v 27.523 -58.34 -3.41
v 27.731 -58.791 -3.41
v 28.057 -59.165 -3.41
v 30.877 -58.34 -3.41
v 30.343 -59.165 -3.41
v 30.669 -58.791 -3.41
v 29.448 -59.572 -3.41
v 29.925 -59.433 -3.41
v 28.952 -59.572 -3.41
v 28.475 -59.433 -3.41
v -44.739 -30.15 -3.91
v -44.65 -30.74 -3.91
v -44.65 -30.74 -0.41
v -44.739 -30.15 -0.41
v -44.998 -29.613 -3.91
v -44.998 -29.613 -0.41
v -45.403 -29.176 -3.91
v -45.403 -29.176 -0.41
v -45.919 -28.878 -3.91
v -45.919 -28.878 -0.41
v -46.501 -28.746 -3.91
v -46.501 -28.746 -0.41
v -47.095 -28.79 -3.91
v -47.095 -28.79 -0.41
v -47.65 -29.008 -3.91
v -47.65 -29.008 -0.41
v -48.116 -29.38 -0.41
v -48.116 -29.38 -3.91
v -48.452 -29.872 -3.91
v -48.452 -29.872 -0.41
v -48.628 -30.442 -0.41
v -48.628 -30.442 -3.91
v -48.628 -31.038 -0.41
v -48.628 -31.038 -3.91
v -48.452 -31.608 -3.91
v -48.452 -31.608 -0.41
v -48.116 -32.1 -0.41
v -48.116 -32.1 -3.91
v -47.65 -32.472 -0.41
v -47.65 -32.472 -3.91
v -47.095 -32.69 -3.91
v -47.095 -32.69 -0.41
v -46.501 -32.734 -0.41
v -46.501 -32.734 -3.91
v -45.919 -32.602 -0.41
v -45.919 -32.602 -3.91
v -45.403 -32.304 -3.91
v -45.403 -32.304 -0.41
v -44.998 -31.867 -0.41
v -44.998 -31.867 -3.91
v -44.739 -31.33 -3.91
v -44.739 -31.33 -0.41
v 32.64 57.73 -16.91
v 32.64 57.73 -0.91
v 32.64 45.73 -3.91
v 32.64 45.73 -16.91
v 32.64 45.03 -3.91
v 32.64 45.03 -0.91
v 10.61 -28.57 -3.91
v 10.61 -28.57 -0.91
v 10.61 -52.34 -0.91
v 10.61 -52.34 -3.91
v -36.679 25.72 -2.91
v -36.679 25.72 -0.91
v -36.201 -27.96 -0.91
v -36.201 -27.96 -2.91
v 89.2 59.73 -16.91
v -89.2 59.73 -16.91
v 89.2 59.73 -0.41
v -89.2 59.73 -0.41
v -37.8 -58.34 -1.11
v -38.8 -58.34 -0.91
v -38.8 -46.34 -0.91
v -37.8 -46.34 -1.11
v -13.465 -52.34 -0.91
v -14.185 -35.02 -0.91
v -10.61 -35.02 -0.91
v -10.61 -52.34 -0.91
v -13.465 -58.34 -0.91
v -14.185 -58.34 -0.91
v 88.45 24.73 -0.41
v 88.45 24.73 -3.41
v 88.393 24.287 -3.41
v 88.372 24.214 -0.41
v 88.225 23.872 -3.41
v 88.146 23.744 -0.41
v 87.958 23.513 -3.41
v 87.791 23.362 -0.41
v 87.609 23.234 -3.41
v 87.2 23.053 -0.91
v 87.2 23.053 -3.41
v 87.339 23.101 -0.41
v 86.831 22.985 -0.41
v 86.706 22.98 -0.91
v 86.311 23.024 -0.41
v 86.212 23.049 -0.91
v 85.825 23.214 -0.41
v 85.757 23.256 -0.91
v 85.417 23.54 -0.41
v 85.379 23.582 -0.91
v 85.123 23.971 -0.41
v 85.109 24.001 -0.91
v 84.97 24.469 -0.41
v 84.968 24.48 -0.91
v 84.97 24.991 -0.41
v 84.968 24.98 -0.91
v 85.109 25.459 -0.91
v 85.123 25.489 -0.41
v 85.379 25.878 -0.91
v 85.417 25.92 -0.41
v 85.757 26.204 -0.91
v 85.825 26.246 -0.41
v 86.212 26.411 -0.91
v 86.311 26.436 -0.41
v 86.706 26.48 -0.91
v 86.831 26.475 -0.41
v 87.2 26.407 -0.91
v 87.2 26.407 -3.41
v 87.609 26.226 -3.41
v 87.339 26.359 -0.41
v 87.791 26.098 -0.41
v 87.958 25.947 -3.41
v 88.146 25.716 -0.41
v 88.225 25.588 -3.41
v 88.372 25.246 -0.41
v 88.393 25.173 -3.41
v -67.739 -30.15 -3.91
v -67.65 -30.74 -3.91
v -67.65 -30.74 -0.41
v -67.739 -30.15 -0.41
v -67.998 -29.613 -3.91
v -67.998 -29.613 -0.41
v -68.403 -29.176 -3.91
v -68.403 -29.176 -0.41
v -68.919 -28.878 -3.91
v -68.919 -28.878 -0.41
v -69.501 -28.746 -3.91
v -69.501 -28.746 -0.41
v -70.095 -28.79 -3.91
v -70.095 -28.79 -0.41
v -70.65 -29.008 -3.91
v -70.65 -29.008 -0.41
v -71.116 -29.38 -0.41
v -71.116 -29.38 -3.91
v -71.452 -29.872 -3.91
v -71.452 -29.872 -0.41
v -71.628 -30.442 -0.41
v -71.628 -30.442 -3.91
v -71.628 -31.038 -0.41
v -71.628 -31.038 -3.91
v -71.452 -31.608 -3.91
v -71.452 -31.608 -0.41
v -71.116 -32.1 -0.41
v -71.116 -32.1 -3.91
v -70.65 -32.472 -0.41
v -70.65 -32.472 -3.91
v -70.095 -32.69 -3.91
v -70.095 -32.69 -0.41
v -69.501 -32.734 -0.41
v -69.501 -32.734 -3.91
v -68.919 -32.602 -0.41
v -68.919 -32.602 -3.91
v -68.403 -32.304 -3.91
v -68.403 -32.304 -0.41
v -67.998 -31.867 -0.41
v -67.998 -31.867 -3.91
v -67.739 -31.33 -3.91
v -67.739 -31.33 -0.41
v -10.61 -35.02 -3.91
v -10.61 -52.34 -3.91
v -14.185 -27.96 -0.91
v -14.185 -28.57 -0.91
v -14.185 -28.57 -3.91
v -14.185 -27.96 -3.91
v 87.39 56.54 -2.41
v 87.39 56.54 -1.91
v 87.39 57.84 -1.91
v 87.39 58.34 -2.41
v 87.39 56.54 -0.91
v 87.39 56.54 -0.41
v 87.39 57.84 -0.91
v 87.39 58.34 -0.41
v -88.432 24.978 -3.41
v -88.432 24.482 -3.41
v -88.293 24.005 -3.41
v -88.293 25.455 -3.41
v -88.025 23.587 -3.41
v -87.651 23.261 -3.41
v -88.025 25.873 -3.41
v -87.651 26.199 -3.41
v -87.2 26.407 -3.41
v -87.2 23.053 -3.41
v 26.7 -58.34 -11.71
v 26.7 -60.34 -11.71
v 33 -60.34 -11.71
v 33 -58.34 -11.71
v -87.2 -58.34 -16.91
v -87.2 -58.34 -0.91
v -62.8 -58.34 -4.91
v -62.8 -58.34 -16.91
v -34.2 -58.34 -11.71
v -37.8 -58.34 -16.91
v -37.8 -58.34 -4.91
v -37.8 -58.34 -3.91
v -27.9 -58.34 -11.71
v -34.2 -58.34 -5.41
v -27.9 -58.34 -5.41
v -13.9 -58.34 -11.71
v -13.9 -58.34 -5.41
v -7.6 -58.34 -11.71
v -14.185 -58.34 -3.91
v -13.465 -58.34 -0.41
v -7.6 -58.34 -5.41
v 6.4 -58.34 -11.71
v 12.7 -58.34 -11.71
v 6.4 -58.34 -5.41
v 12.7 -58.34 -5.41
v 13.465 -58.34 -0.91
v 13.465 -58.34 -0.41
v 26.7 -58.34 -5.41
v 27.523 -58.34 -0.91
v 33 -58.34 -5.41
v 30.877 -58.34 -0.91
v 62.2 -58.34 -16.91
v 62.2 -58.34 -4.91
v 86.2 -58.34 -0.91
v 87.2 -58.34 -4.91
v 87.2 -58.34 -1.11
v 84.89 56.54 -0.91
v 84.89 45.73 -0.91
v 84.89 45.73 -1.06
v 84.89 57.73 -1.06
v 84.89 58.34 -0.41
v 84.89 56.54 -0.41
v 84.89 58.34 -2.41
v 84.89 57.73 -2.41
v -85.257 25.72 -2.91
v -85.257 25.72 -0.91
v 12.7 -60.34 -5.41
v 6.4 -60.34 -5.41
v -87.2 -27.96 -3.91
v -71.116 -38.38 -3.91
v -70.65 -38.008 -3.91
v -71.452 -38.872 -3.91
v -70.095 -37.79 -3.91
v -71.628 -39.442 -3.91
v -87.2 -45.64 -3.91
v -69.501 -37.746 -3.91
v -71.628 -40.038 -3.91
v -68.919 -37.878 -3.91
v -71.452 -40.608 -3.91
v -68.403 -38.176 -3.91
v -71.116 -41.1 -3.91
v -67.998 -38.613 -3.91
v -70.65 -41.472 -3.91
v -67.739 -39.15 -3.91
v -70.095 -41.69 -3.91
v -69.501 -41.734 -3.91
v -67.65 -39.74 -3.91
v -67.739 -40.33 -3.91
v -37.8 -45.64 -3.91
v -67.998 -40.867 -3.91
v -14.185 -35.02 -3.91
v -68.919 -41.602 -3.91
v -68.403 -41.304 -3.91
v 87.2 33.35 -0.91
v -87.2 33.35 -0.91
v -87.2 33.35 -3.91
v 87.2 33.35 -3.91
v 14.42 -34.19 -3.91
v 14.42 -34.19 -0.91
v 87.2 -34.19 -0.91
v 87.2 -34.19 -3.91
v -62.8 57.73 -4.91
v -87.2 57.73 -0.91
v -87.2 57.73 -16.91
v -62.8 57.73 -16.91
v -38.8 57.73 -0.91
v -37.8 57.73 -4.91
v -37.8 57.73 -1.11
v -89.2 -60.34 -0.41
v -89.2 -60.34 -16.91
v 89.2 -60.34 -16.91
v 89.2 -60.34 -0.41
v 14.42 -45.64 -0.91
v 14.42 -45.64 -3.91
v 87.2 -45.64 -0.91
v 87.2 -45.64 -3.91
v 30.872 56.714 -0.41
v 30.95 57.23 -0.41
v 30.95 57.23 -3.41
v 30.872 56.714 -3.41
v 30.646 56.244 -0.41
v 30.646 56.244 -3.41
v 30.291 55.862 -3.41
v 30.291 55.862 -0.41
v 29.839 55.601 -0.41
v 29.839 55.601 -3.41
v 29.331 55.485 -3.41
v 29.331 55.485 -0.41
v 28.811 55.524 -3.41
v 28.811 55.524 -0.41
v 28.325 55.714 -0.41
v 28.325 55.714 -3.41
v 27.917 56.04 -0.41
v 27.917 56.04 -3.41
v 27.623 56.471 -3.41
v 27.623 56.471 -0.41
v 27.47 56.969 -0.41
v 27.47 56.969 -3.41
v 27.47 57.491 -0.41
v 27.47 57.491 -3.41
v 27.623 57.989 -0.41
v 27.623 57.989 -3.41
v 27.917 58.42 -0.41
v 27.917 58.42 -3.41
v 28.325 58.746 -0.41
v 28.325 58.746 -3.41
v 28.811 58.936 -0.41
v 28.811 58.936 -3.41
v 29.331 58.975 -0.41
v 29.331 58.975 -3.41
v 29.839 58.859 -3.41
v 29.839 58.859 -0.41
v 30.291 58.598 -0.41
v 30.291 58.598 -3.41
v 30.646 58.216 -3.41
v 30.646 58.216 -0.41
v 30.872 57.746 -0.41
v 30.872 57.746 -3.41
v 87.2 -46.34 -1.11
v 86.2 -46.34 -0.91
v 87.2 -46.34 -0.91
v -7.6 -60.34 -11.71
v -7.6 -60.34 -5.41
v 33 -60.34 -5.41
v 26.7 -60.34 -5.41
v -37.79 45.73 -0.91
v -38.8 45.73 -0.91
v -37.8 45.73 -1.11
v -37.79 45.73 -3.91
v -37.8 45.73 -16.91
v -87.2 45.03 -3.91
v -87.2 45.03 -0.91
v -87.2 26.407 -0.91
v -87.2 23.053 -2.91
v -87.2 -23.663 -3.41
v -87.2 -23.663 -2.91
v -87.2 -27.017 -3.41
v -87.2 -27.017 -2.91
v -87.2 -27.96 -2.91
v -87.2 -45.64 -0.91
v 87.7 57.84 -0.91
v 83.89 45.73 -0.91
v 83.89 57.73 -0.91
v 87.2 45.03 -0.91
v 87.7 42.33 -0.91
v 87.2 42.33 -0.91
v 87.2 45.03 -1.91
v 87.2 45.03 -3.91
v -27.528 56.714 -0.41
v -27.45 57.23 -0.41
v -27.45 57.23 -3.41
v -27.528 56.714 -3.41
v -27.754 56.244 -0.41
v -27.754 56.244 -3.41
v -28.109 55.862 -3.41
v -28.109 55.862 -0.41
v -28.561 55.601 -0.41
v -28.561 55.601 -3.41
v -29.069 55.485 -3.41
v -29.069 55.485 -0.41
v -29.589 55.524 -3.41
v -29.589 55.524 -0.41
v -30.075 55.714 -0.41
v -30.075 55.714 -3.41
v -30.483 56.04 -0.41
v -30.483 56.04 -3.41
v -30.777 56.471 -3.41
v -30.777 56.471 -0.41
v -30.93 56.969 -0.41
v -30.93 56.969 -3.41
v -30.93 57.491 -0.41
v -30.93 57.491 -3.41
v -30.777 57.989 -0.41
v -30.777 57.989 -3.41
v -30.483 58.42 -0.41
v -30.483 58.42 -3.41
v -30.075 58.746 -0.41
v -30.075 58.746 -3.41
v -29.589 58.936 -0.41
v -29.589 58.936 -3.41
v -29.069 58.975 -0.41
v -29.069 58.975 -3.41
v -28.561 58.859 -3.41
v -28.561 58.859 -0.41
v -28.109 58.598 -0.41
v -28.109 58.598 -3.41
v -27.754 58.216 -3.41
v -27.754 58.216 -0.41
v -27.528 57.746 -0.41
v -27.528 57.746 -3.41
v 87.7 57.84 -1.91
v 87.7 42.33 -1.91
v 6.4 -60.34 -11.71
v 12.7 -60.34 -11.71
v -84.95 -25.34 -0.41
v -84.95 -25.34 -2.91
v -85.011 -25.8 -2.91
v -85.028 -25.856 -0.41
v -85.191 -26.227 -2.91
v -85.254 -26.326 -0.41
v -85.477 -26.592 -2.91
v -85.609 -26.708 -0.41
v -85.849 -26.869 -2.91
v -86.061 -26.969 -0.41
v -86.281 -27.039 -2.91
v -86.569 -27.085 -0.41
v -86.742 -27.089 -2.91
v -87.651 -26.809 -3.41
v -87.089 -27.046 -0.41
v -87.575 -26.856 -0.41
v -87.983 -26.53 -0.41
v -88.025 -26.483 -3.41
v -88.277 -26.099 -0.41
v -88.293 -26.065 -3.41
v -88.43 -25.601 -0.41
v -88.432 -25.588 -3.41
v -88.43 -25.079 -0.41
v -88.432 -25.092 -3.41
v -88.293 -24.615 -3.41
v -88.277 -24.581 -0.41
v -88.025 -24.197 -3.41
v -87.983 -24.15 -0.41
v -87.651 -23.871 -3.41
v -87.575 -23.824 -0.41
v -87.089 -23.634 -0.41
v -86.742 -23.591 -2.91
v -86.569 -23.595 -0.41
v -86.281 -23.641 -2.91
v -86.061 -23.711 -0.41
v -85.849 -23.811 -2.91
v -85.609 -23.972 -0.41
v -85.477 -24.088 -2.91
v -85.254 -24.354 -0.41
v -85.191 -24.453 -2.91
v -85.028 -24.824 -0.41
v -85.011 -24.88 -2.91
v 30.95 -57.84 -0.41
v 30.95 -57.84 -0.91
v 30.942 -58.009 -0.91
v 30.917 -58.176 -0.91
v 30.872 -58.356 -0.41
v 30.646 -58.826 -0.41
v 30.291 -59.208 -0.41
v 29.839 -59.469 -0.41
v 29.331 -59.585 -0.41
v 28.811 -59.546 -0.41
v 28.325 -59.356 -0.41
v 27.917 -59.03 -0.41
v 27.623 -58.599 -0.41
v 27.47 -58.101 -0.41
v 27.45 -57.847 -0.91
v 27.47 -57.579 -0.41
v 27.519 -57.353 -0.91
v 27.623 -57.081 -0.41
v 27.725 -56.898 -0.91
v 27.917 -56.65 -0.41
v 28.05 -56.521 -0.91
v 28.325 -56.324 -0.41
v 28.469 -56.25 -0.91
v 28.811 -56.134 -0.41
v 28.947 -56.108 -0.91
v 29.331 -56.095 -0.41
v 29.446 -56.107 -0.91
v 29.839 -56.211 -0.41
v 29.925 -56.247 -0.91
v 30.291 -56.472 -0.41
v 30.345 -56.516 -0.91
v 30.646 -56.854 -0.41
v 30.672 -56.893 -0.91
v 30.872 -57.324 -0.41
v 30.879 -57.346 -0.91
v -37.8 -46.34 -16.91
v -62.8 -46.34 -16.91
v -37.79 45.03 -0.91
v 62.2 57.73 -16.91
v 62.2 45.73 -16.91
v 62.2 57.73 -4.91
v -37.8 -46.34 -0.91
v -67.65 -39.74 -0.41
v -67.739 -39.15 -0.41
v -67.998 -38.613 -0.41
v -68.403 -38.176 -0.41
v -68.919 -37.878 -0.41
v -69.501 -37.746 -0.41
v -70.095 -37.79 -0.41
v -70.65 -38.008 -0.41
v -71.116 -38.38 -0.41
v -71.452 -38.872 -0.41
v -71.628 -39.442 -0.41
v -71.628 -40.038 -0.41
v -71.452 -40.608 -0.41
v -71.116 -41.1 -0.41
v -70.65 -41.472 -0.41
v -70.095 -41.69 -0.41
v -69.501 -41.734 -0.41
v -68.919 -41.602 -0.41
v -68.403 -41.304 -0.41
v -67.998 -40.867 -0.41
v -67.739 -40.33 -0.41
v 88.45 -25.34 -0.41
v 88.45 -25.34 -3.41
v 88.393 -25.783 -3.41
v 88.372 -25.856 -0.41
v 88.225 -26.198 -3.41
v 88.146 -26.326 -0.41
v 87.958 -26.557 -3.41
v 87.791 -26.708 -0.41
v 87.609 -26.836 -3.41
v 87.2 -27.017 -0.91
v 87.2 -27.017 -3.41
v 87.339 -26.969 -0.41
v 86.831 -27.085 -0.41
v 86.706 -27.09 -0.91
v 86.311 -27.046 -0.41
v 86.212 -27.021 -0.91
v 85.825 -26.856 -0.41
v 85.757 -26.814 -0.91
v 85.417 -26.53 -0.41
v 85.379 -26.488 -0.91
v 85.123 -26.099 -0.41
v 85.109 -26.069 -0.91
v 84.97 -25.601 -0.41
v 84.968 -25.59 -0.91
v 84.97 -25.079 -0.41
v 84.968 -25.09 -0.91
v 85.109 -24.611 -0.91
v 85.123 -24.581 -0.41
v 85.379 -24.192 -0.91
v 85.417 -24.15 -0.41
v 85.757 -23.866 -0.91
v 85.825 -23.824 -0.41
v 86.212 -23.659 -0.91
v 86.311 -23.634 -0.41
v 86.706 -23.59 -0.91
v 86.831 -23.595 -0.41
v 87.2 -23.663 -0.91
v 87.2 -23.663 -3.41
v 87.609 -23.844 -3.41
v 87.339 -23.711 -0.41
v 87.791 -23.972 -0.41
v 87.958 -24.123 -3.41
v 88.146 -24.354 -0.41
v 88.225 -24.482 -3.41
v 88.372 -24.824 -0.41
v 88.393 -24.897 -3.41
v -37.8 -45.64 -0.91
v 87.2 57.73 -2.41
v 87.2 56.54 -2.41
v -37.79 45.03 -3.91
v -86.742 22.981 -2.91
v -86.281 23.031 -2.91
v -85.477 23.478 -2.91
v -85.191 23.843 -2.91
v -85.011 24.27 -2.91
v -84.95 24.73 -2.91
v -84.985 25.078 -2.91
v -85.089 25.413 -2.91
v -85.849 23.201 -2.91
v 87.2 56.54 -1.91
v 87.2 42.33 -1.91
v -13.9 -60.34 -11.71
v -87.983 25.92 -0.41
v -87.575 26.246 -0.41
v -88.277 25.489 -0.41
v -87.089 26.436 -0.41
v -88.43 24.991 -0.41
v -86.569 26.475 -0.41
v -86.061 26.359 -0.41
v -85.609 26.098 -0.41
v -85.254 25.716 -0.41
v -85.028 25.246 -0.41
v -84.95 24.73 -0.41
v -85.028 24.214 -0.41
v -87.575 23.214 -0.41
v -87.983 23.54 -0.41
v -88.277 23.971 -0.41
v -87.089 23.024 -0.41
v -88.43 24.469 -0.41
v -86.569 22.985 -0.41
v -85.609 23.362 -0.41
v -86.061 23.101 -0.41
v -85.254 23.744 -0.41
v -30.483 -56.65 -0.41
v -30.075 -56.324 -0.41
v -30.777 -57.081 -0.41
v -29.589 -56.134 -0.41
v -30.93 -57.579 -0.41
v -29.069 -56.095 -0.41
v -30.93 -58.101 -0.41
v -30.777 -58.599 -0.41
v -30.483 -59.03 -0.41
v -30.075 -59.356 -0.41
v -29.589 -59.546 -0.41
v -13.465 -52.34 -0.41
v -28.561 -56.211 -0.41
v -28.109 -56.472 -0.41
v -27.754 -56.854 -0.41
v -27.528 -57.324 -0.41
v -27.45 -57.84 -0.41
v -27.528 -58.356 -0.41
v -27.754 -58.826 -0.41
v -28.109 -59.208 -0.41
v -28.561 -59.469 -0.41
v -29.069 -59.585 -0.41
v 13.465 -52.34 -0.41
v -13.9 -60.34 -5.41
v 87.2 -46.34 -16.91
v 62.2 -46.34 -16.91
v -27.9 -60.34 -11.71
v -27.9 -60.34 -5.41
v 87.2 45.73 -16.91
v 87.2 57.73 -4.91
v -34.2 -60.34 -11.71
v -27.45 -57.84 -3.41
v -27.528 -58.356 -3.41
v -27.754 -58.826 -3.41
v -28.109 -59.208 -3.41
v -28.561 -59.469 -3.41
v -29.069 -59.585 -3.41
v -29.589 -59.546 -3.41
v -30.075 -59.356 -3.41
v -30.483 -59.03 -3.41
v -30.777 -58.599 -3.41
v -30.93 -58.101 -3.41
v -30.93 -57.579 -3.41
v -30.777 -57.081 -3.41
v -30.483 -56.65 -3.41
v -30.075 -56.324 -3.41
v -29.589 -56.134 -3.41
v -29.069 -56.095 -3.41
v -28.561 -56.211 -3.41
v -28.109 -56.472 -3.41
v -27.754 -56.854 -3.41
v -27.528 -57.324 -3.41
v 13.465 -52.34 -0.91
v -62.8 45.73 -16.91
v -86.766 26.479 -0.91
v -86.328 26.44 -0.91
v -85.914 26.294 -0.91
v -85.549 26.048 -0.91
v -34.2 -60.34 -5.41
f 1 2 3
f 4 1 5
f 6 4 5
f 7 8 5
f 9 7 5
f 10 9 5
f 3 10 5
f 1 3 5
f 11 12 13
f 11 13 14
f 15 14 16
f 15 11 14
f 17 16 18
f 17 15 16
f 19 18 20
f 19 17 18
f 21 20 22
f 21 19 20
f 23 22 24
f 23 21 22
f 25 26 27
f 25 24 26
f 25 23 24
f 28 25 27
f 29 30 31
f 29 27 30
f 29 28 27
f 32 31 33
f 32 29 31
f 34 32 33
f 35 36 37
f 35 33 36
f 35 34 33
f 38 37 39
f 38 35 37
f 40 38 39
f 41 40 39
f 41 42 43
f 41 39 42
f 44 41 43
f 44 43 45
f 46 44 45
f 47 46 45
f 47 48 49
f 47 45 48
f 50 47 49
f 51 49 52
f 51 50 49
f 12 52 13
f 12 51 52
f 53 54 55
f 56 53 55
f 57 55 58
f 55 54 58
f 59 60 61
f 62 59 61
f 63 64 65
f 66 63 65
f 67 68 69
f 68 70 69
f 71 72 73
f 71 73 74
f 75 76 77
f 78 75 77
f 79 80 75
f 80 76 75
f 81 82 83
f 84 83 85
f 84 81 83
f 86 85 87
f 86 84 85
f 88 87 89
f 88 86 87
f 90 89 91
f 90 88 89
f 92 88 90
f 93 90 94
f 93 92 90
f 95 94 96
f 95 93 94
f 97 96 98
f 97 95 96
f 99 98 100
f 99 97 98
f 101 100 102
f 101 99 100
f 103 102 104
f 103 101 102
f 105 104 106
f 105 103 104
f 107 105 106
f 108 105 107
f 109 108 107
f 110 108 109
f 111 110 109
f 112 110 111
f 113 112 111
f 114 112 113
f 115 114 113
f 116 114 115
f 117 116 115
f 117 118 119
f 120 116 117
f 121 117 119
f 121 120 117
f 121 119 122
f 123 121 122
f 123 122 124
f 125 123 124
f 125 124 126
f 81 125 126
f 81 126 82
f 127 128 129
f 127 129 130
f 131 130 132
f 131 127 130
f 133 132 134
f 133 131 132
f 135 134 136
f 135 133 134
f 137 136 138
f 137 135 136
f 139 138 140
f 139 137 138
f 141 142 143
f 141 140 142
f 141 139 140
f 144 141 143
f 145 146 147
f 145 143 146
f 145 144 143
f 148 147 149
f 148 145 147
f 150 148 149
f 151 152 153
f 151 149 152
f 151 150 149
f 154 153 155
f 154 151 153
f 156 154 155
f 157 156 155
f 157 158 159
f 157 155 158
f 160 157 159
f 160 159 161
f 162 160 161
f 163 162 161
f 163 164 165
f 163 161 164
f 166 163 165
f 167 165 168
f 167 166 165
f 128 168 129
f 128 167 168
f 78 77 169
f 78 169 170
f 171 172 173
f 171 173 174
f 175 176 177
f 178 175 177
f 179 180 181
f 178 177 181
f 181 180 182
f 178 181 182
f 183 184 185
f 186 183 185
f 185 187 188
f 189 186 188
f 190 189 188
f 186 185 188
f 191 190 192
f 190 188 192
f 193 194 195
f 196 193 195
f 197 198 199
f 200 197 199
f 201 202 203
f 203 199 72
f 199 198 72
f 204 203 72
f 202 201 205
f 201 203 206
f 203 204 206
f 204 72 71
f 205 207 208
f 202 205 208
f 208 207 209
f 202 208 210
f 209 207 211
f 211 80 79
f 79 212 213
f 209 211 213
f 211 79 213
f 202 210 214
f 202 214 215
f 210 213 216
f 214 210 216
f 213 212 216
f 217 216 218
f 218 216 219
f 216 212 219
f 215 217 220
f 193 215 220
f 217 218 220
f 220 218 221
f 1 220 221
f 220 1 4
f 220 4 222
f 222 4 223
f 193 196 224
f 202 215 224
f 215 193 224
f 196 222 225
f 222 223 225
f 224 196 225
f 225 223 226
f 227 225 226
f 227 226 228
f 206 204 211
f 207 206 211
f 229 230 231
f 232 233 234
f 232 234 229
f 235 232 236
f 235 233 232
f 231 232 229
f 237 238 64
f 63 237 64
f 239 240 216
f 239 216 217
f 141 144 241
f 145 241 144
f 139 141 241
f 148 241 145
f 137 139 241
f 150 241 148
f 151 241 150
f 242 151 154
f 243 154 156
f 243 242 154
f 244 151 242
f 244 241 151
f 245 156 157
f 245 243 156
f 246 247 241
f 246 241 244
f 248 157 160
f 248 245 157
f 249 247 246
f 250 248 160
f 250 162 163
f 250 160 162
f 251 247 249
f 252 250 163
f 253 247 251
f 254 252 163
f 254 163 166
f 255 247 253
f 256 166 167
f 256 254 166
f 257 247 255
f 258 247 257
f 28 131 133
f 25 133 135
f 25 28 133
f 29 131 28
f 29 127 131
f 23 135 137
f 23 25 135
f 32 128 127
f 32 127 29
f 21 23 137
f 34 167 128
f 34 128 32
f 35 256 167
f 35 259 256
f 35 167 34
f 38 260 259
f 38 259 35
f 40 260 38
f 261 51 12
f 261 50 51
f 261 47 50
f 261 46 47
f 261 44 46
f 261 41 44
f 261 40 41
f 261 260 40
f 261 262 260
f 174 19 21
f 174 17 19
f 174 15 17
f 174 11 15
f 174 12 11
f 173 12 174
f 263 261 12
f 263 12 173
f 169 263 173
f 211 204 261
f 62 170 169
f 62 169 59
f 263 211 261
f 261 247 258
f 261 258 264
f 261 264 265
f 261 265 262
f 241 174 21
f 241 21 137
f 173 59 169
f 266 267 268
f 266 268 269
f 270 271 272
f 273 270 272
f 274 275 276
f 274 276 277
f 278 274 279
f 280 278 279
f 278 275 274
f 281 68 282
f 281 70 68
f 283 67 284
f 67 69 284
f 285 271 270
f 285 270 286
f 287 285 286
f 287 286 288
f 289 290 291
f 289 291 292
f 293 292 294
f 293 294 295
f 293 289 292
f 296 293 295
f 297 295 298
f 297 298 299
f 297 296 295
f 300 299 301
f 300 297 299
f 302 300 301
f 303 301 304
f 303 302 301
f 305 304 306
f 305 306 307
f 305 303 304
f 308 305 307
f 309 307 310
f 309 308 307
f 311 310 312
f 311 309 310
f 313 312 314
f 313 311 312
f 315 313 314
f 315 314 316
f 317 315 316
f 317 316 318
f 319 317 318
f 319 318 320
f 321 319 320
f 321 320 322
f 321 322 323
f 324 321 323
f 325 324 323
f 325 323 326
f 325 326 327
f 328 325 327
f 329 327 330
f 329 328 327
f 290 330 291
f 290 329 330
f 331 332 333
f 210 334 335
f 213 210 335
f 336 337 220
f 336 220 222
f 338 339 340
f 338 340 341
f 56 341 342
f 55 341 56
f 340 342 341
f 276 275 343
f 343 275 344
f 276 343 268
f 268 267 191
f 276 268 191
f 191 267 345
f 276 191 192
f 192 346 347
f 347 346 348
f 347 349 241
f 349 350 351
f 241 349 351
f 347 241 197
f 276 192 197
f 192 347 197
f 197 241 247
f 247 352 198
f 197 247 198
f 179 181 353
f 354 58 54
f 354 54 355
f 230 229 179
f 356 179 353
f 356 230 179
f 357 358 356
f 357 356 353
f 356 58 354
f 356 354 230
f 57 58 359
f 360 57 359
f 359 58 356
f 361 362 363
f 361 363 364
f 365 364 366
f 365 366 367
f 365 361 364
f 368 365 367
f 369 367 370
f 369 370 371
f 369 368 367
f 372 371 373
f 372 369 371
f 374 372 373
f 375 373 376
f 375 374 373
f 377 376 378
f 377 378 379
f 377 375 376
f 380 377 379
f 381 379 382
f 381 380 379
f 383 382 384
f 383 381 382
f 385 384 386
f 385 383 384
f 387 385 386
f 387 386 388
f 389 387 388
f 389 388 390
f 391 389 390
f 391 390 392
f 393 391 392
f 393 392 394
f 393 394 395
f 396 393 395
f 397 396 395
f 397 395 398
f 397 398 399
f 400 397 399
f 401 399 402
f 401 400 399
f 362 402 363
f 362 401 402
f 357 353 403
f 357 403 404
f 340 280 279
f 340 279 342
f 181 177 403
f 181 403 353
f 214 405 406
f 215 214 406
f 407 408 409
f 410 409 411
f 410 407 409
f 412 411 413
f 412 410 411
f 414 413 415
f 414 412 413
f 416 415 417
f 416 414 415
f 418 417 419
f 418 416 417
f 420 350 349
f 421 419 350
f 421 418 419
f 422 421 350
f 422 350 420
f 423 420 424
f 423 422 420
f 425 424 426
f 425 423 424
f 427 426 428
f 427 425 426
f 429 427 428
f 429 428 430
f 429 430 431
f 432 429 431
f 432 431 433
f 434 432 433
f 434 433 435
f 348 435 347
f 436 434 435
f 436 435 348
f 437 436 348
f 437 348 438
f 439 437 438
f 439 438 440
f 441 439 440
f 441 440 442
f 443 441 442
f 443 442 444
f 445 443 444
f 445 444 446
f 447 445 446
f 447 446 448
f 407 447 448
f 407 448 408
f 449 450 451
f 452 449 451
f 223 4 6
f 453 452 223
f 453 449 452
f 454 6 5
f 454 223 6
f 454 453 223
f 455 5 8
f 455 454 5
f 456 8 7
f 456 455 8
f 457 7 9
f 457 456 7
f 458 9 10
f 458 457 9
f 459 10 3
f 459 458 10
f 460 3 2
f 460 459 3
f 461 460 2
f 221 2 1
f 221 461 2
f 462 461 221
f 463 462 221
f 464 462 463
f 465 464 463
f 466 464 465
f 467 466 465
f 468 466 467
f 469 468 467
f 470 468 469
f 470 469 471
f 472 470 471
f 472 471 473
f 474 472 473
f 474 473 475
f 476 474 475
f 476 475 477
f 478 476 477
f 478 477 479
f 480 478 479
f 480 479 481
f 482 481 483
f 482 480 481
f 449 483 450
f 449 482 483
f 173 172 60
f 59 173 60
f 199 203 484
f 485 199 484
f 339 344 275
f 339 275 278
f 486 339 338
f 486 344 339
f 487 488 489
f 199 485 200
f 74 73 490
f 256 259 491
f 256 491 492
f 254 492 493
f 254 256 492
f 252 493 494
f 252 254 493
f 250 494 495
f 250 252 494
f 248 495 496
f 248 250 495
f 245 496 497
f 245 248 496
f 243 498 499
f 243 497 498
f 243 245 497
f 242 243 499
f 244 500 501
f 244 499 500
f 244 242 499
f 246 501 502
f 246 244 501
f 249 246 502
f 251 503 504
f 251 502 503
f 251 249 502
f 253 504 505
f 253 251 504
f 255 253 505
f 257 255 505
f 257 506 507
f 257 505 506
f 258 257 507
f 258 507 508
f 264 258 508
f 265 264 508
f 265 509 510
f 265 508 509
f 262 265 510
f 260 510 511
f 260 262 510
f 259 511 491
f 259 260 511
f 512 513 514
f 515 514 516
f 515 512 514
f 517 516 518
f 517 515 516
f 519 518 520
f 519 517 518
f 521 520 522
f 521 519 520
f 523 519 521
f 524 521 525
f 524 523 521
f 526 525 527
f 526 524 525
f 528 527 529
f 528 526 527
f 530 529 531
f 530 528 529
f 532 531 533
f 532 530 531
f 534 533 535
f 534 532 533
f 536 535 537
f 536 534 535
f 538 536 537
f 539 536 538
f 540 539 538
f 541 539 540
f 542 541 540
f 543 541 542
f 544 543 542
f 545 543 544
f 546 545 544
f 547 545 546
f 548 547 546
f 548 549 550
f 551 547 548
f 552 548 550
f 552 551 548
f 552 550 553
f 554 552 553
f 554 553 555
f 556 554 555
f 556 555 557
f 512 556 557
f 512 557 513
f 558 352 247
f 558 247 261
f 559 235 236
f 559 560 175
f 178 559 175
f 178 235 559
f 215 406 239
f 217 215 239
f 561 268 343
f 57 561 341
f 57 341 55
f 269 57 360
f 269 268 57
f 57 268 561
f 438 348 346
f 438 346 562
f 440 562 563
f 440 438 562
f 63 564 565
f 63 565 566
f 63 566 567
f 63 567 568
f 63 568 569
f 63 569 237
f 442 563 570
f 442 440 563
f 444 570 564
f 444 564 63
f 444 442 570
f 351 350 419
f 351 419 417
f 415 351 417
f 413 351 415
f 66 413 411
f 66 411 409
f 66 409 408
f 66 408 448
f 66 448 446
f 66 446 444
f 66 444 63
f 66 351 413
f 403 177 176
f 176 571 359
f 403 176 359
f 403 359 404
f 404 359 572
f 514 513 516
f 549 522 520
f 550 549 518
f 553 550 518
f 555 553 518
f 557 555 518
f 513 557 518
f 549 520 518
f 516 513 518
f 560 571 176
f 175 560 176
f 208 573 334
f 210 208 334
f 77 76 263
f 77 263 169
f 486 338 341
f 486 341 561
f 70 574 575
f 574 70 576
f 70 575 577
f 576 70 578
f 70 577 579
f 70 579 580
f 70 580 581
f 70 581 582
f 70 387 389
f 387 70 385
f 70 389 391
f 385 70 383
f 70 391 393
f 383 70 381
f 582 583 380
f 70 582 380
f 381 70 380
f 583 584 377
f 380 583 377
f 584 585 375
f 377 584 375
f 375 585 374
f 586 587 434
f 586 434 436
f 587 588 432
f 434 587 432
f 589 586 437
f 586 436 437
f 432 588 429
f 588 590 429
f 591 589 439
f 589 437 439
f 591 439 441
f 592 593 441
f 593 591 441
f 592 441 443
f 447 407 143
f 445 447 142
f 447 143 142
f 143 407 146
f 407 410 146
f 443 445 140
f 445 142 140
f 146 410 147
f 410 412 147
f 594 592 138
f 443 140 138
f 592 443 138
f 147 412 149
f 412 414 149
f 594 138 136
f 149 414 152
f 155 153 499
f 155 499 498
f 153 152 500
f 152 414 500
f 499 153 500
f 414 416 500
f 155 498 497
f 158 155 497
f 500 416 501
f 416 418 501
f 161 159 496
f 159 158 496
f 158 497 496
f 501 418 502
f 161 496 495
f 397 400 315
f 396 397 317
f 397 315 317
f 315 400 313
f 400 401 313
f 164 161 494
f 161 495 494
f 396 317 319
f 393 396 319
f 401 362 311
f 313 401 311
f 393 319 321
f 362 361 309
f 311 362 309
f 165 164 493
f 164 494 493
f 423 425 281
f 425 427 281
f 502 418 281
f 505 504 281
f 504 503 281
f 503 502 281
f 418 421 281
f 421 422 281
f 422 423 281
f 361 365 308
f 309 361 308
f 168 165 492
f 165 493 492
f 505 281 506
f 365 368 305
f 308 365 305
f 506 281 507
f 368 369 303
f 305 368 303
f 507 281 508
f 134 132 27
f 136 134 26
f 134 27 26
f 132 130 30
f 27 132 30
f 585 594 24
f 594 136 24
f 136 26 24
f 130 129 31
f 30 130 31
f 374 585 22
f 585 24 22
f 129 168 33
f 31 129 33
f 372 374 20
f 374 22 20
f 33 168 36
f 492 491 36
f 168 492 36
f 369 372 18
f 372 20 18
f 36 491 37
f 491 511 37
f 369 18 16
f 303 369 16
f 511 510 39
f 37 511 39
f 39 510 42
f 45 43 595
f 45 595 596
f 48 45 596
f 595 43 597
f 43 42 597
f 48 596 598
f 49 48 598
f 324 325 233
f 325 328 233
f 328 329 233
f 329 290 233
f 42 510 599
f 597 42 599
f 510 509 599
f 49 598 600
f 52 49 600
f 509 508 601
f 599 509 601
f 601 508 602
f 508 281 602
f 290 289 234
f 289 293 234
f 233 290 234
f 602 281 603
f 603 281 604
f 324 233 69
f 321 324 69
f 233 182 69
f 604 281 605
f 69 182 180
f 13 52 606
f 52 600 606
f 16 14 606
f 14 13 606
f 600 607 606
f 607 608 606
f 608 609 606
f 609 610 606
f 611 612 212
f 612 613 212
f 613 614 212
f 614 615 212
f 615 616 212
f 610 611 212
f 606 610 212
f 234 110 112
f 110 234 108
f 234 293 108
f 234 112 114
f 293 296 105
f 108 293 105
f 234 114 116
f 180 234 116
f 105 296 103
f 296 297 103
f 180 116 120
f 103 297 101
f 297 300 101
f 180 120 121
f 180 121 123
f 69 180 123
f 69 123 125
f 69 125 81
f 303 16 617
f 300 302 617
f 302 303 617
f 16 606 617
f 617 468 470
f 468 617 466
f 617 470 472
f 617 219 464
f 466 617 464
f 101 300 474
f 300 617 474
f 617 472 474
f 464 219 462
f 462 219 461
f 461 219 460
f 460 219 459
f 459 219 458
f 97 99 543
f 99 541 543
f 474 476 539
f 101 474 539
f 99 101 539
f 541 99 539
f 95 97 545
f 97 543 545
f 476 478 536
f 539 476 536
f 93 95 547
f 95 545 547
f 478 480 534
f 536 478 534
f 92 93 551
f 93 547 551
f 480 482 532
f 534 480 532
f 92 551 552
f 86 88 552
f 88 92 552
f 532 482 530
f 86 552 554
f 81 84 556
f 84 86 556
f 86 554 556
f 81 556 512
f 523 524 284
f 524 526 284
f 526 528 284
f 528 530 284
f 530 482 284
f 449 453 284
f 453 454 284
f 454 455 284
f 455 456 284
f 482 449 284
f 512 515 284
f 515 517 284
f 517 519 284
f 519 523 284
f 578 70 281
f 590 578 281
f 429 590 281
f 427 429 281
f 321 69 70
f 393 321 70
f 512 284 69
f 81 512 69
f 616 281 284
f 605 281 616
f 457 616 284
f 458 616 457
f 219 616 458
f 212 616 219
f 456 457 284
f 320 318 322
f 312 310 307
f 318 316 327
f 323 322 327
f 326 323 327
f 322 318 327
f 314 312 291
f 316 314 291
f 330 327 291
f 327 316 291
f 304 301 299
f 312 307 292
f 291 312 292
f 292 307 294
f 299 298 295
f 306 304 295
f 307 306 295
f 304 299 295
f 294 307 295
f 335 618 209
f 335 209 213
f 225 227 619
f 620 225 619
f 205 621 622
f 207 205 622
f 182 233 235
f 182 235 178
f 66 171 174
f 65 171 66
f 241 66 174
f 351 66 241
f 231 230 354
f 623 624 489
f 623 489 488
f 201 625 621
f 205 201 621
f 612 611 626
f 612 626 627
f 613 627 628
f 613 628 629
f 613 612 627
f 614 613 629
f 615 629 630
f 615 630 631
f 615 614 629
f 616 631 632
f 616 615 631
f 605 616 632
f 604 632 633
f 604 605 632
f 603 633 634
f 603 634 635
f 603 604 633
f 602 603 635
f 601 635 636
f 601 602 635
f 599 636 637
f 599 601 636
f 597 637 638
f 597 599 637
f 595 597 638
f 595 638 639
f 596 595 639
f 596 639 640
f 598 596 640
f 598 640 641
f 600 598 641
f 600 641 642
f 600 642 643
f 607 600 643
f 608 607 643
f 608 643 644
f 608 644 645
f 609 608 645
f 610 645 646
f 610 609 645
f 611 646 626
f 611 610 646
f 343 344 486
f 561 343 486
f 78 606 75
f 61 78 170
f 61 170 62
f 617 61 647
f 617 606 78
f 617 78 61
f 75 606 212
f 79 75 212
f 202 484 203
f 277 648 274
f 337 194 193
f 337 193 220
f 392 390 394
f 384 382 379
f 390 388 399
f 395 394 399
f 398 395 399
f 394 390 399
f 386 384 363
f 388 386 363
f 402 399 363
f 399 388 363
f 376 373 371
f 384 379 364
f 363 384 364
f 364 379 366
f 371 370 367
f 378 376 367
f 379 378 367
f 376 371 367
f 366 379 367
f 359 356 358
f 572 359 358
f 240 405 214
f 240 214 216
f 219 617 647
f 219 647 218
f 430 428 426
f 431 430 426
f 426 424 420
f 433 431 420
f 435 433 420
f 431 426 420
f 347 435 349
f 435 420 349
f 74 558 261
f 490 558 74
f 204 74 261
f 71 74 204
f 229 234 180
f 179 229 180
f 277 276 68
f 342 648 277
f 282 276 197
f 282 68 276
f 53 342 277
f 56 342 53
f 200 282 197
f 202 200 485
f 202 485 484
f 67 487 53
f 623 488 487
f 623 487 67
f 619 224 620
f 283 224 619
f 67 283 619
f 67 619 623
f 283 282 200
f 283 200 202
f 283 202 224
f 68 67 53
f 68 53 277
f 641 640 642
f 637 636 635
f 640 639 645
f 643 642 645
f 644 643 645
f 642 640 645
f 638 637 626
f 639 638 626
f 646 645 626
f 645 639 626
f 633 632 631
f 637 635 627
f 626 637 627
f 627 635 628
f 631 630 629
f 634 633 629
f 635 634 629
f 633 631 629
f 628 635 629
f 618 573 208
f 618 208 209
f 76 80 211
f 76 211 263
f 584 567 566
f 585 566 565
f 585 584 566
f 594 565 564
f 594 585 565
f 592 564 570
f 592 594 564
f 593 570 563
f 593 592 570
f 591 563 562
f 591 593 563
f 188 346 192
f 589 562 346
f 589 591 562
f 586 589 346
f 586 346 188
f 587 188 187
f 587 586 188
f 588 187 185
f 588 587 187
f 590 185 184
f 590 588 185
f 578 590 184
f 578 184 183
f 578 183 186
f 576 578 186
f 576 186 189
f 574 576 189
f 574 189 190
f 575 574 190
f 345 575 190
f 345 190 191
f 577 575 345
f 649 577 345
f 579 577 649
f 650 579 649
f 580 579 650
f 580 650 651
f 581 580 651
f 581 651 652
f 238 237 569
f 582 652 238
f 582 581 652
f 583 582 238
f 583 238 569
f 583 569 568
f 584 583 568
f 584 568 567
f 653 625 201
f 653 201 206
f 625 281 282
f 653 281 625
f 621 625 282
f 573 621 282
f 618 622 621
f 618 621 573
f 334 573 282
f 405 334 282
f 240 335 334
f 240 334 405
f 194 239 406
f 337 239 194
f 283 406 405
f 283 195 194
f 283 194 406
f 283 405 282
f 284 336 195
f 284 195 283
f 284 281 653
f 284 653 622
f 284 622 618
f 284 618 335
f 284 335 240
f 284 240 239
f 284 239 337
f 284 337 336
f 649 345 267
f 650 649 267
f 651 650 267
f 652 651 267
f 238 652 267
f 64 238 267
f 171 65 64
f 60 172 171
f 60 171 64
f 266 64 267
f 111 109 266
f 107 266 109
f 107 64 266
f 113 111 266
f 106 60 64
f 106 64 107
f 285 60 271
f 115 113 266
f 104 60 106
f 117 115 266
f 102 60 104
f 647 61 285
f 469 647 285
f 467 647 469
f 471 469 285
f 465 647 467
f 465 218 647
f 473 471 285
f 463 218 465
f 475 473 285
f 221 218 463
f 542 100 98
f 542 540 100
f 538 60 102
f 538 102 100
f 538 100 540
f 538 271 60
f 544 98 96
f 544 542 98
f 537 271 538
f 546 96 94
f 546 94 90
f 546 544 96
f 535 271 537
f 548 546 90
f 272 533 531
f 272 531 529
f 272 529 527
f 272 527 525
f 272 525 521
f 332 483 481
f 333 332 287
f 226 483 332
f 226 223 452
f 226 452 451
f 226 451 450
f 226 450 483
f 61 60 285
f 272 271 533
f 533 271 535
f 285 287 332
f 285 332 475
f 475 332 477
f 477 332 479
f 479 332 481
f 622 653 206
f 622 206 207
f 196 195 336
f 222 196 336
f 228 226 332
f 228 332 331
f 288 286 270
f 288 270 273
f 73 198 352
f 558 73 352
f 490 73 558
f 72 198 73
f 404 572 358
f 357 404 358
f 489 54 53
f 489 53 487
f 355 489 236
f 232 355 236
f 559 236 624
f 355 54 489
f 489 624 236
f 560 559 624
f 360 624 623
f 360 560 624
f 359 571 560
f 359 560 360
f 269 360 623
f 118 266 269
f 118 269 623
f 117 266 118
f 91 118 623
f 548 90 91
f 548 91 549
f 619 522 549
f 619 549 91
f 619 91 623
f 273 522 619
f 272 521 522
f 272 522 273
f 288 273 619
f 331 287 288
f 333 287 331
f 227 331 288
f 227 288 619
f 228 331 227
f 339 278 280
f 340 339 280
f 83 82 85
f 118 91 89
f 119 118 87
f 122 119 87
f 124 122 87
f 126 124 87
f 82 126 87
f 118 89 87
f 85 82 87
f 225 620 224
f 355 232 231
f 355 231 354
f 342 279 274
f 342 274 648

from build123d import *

# Parameters (mm, degrees)
SKETCH028_W         = 178.4
SKETCH028_H         = 120.07
PAD017_DEPTH        = 1
SKETCH029_R         = 1.75
PAD018_DEPTH        = 3
SKETCH026_W         = 32
SKETCH026_H         = 18
PAD015_DEPTH        = 1
SKETCH027_R         = 2
PAD016_DEPTH        = 10
SKETCH002_W         = 178.4
SKETCH002_H         = 120.07
SKETCH002_W_2       = 26.9298
SKETCH002_H_2       = 6
PAD002_DEPTH        = 0.5
SKETCH003_W         = 178.4
SKETCH003_H         = 120.07
SKETCH003_W_2       = 174.4
SKETCH003_H_2       = 116.07
PAD003_DEPTH        = 16
PAD004_DEPTH        = 25
LINEARPATTERN_COUNT = 2
LINEARPATTERN_PITCH = 125
SKETCH012_R         = 0.8
POCKET002_DEPTH     = 2.5
SKETCH013_W         = 2.5
SKETCH013_H         = 1.8
POCKET003_DEPTH     = 2
SKETCH017_W         = 6.3
SKETCH017_H         = 6.3
POCKET004_DEPTH     = 5
PAD010_DEPTH        = 2
SKETCH019_W         = 15.51
SKETCH019_H         = 1
POCKET005_DEPTH     = 0.5
SKETCH020_W         = 70.44
SKETCH020_H         = 12
PAD011_DEPTH        = 16
PAD012_DEPTH        = 12
PAD013_DEPTH        = 12
SKETCH025_W         = 21.22
SKETCH025_H         = 23.77
SKETCH025_W_2       = 3.5749
SKETCH025_H_2       = 6.45
SKETCH025_W_3       = 72.78
SKETCH025_H_3       = 11.45
SKETCH025_W_4       = 174.4
SKETCH025_H_4       = 11.68
SKETCH025_W_5       = 70.43
SKETCH025_H_5       = 0.7
PAD014_DEPTH        = 3


with BuildPart() as holes_bezel:
    # Sketch028 (on Face1 of Binder013) → Pad017 (new body)
    with BuildSketch(Plane(origin=(0, 0, -0.41), x_dir=(1, 0, 0), z_dir=(0, 0, -1))):
        with Locations((0, 0.305)):
            Rectangle(SKETCH028_W, SKETCH028_H)
    extrude(amount=-PAD017_DEPTH)

    # Sketch029 (on Face5 of Pad017) → Pad018 (join)
    with BuildSketch(Plane(origin=(0, 0, -0.41), x_dir=(1, 0, 0), z_dir=(0, 0, -1))):
        with Locations((29.2, 57.84)):
            Circle(SKETCH029_R)
        with Locations((-29.2, 57.84)):
            Circle(SKETCH029_R)
        with Locations((86.7, 25.34)):
            Circle(SKETCH029_R)
        with Locations((86.7, -24.73)):
            Circle(SKETCH029_R)
        with Locations((29.2, -57.23)):
            Circle(SKETCH029_R)
        with Locations((-29.2, -57.23)):
            Circle(SKETCH029_R)
        with Locations((-86.7, -24.73)):
            Circle(SKETCH029_R)
        with Locations((-86.7, 25.34)):
            Circle(SKETCH029_R)
    extrude(amount=PAD018_DEPTH)


with BuildPart() as holes:
    # Sketch026 (on Face9 of Binder011) → Pad015 (new body)
    with BuildSketch(Plane(origin=(0, 0, -6.91), x_dir=(1, 0, 0), z_dir=(0, 0, -1))):
        with Locations((-58.15, 35.24)):
            Rectangle(SKETCH026_W, SKETCH026_H)
    extrude(amount=PAD015_DEPTH)

    # Sketch027 (on Face5 of Pad015) → Pad016 (join)
    with BuildSketch(Plane.XY.offset(-6.91)):
        with Locations((-69.65, -30.74)):
            Circle(SKETCH027_R)
        with Locations((-46.65, -30.74)):
            Circle(SKETCH027_R)
        with Locations((-69.65, -39.74)):
            Circle(SKETCH027_R)
    extrude(amount=PAD016_DEPTH)


with BuildPart() as cut_case:
    # Sketch002 (on Face1 of Binder001) → Pad002 (new body)
    with BuildSketch(Plane(origin=(0, 0, -0.41), x_dir=(1, 0, 0), z_dir=(0, 0, -1))):
        with Locations((0, 0.305)):
            Rectangle(SKETCH002_W, SKETCH002_H)
        with Locations((0, 55.34)):
            Rectangle(SKETCH002_W_2, SKETCH002_H_2, mode=Mode.SUBTRACT)
    extrude(amount=PAD002_DEPTH)

    # Sketch003 (on Face10 of Pad002) → Pad003 (join)
    with BuildSketch(Plane(origin=(0, 0, -0.91), x_dir=(1, 0, 0), z_dir=(0, 0, -1))):
        with Locations((0, 0.305)):
            Rectangle(SKETCH003_W, SKETCH003_H)
        with Locations((0, 0.305)):
            Rectangle(SKETCH003_W_2, SKETCH003_H_2, mode=Mode.SUBTRACT)
    extrude(amount=PAD003_DEPTH)

    # Sketch004 (on Face9 of Pad003) → Pad004 (join)
    with BuildSketch(Plane(origin=(87.2, 0, 0), x_dir=(0, -1, 0), z_dir=(-1, 0, 0))):
        Polygon((-57.73, -16.91), (-57.73, -4.91), (-45.73, -16.91), align=None)
        Polygon((58.34, -16.91), (58.34, -4.91), (46.34, -16.91), align=None)
    pad004 = extrude(amount=PAD004_DEPTH)

    # LinearPattern: Pad004 ×2
    with Locations(*[(-i * LINEARPATTERN_PITCH, 0, 0) for i in range(1, LINEARPATTERN_COUNT)]):
        add(pad004)

    # Sketch012 (on Face1 of LinearPattern) → Pocket002 (cut)
    with BuildSketch(Plane.XY.offset(-0.41)):
        with Locations((-86.7, 24.73)):
            Circle(SKETCH012_R)
        with Locations((-86.7, -25.34)):
            Circle(SKETCH012_R)
        with Locations((-29.2, -57.84)):
            Circle(SKETCH012_R)
        with Locations((29.2, -57.84)):
            Circle(SKETCH012_R)
        with Locations((86.7, -25.34)):
            Circle(SKETCH012_R)
        with Locations((86.7, 24.73)):
            Circle(SKETCH012_R)
        with Locations((29.2, 57.23)):
            Circle(SKETCH012_R)
        with Locations((-29.2, 57.23)):
            Circle(SKETCH012_R)
    extrude(amount=-POCKET002_DEPTH, mode=Mode.SUBTRACT)

    # Sketch013 (on Face1 of Pocket002) → Pocket003 (cut)
    with BuildSketch(Plane.XY.offset(-0.41)):
        with Locations((86.14, 57.44)):
            Rectangle(SKETCH013_W, SKETCH013_H)
    extrude(amount=-POCKET003_DEPTH, mode=Mode.SUBTRACT)

    # Sketch017 (on Face3 of Pocket003) → Pocket004 (cut)
    with BuildSketch(Plane.XZ.offset(60.34)):
        with Locations((-31.05, -8.56)):
            Rectangle(SKETCH017_W, SKETCH017_H)
        with Locations((-10.75, -8.56)):
            Rectangle(SKETCH017_W, SKETCH017_H)
        with Locations((9.55, -8.56)):
            Rectangle(SKETCH017_W, SKETCH017_H)
        with Locations((29.85, -8.56)):
            Rectangle(SKETCH017_W, SKETCH017_H)
    extrude(amount=-POCKET004_DEPTH, mode=Mode.SUBTRACT)

    # Sketch018 (on Face39 of Pocket004) → Pad010 (join)
    with BuildSketch(Plane(origin=(0, 0, -0.91), x_dir=(1, 0, 0), z_dir=(0, 0, -1))):
        Polygon((-87.2, 29.22), (-87.2, -25.72), (-36.679044, -25.72), (-36.19, 29.22), align=None)
    extrude(amount=PAD010_DEPTH)

    # Sketch019 (on Face42 of Pad010) → Pocket005 (cut)
    with BuildSketch(Plane(origin=(87.2, 0, 0), x_dir=(0, -1, 0), z_dir=(-1, 0, 0))):
        with Locations((-50.085, -1.41)):
            Rectangle(SKETCH019_W, SKETCH019_H)
    extrude(amount=-POCKET005_DEPTH, mode=Mode.SUBTRACT)

    # Sketch020 (on Face74 of Pocket005) → Pad011 (join)
    with BuildSketch(Plane(origin=(0, 0, -0.91), x_dir=(1, 0, 0), z_dir=(0, 0, -1))):
        with Locations((-2.58, -51.73)):
            Rectangle(SKETCH020_W, SKETCH020_H)
    extrude(amount=PAD011_DEPTH)

    # Sketch022 (on Face69 of Pad011) → Pad012 (join)
    with BuildSketch(Plane.XZ.offset(-57.73)):
        Polygon((-38.8, -0.91), (-37.8, -1.11), (-37.8, -0.91), align=None)
        Polygon((84.89, -1.06), (83.89, -0.91), (84.89, -0.91), align=None)
    extrude(amount=PAD012_DEPTH)

    # Sketch023 (on Face10 of Pad012) → Pad013 (join)
    with BuildSketch(Plane(origin=(0, -58.34, 0), x_dir=(-1, 0, 0), z_dir=(0, 1, 0))):
        Polygon((37.8, -0.91), (38.8, -0.91), (37.8, -1.11), align=None)
        Polygon((-87.2, -0.91), (-86.2, -0.91), (-87.2, -1.11), align=None)
    extrude(amount=PAD013_DEPTH)

    # Sketch025 (on Face39 of Pad013) → Pad014 (join)
    with BuildSketch(Plane(origin=(0, 0, -0.91), x_dir=(1, 0, 0), z_dir=(0, 0, -1))):
        with Locations((0, 40.455)):
            Rectangle(SKETCH025_W, SKETCH025_H)
        Polygon((-14.1849, 27.96), (-87.2, 27.96), (-87.2, 45.64), (-37.8, 45.64), (-37.8, 58.34), (-14.1849, 58.34), align=None)
        with Locations((-12.39745, 31.795)):
            Rectangle(SKETCH025_W_2, SKETCH025_H_2)
        with Locations((50.81, 39.915)):
            Rectangle(SKETCH025_W_3, SKETCH025_H_3)
        with Locations((0, -39.19)):
            Rectangle(SKETCH025_W_4, SKETCH025_H_4)
        with Locations((-2.575, -45.38)):
            Rectangle(SKETCH025_W_5, SKETCH025_H_5)
    extrude(amount=PAD014_DEPTH)

    # Cut: cut holes
    add(holes.part, mode=Mode.SUBTRACT)

    # Cut001: cut holes bezel
    add(holes_bezel.part, mode=Mode.SUBTRACT)


solid = cut_case.part
